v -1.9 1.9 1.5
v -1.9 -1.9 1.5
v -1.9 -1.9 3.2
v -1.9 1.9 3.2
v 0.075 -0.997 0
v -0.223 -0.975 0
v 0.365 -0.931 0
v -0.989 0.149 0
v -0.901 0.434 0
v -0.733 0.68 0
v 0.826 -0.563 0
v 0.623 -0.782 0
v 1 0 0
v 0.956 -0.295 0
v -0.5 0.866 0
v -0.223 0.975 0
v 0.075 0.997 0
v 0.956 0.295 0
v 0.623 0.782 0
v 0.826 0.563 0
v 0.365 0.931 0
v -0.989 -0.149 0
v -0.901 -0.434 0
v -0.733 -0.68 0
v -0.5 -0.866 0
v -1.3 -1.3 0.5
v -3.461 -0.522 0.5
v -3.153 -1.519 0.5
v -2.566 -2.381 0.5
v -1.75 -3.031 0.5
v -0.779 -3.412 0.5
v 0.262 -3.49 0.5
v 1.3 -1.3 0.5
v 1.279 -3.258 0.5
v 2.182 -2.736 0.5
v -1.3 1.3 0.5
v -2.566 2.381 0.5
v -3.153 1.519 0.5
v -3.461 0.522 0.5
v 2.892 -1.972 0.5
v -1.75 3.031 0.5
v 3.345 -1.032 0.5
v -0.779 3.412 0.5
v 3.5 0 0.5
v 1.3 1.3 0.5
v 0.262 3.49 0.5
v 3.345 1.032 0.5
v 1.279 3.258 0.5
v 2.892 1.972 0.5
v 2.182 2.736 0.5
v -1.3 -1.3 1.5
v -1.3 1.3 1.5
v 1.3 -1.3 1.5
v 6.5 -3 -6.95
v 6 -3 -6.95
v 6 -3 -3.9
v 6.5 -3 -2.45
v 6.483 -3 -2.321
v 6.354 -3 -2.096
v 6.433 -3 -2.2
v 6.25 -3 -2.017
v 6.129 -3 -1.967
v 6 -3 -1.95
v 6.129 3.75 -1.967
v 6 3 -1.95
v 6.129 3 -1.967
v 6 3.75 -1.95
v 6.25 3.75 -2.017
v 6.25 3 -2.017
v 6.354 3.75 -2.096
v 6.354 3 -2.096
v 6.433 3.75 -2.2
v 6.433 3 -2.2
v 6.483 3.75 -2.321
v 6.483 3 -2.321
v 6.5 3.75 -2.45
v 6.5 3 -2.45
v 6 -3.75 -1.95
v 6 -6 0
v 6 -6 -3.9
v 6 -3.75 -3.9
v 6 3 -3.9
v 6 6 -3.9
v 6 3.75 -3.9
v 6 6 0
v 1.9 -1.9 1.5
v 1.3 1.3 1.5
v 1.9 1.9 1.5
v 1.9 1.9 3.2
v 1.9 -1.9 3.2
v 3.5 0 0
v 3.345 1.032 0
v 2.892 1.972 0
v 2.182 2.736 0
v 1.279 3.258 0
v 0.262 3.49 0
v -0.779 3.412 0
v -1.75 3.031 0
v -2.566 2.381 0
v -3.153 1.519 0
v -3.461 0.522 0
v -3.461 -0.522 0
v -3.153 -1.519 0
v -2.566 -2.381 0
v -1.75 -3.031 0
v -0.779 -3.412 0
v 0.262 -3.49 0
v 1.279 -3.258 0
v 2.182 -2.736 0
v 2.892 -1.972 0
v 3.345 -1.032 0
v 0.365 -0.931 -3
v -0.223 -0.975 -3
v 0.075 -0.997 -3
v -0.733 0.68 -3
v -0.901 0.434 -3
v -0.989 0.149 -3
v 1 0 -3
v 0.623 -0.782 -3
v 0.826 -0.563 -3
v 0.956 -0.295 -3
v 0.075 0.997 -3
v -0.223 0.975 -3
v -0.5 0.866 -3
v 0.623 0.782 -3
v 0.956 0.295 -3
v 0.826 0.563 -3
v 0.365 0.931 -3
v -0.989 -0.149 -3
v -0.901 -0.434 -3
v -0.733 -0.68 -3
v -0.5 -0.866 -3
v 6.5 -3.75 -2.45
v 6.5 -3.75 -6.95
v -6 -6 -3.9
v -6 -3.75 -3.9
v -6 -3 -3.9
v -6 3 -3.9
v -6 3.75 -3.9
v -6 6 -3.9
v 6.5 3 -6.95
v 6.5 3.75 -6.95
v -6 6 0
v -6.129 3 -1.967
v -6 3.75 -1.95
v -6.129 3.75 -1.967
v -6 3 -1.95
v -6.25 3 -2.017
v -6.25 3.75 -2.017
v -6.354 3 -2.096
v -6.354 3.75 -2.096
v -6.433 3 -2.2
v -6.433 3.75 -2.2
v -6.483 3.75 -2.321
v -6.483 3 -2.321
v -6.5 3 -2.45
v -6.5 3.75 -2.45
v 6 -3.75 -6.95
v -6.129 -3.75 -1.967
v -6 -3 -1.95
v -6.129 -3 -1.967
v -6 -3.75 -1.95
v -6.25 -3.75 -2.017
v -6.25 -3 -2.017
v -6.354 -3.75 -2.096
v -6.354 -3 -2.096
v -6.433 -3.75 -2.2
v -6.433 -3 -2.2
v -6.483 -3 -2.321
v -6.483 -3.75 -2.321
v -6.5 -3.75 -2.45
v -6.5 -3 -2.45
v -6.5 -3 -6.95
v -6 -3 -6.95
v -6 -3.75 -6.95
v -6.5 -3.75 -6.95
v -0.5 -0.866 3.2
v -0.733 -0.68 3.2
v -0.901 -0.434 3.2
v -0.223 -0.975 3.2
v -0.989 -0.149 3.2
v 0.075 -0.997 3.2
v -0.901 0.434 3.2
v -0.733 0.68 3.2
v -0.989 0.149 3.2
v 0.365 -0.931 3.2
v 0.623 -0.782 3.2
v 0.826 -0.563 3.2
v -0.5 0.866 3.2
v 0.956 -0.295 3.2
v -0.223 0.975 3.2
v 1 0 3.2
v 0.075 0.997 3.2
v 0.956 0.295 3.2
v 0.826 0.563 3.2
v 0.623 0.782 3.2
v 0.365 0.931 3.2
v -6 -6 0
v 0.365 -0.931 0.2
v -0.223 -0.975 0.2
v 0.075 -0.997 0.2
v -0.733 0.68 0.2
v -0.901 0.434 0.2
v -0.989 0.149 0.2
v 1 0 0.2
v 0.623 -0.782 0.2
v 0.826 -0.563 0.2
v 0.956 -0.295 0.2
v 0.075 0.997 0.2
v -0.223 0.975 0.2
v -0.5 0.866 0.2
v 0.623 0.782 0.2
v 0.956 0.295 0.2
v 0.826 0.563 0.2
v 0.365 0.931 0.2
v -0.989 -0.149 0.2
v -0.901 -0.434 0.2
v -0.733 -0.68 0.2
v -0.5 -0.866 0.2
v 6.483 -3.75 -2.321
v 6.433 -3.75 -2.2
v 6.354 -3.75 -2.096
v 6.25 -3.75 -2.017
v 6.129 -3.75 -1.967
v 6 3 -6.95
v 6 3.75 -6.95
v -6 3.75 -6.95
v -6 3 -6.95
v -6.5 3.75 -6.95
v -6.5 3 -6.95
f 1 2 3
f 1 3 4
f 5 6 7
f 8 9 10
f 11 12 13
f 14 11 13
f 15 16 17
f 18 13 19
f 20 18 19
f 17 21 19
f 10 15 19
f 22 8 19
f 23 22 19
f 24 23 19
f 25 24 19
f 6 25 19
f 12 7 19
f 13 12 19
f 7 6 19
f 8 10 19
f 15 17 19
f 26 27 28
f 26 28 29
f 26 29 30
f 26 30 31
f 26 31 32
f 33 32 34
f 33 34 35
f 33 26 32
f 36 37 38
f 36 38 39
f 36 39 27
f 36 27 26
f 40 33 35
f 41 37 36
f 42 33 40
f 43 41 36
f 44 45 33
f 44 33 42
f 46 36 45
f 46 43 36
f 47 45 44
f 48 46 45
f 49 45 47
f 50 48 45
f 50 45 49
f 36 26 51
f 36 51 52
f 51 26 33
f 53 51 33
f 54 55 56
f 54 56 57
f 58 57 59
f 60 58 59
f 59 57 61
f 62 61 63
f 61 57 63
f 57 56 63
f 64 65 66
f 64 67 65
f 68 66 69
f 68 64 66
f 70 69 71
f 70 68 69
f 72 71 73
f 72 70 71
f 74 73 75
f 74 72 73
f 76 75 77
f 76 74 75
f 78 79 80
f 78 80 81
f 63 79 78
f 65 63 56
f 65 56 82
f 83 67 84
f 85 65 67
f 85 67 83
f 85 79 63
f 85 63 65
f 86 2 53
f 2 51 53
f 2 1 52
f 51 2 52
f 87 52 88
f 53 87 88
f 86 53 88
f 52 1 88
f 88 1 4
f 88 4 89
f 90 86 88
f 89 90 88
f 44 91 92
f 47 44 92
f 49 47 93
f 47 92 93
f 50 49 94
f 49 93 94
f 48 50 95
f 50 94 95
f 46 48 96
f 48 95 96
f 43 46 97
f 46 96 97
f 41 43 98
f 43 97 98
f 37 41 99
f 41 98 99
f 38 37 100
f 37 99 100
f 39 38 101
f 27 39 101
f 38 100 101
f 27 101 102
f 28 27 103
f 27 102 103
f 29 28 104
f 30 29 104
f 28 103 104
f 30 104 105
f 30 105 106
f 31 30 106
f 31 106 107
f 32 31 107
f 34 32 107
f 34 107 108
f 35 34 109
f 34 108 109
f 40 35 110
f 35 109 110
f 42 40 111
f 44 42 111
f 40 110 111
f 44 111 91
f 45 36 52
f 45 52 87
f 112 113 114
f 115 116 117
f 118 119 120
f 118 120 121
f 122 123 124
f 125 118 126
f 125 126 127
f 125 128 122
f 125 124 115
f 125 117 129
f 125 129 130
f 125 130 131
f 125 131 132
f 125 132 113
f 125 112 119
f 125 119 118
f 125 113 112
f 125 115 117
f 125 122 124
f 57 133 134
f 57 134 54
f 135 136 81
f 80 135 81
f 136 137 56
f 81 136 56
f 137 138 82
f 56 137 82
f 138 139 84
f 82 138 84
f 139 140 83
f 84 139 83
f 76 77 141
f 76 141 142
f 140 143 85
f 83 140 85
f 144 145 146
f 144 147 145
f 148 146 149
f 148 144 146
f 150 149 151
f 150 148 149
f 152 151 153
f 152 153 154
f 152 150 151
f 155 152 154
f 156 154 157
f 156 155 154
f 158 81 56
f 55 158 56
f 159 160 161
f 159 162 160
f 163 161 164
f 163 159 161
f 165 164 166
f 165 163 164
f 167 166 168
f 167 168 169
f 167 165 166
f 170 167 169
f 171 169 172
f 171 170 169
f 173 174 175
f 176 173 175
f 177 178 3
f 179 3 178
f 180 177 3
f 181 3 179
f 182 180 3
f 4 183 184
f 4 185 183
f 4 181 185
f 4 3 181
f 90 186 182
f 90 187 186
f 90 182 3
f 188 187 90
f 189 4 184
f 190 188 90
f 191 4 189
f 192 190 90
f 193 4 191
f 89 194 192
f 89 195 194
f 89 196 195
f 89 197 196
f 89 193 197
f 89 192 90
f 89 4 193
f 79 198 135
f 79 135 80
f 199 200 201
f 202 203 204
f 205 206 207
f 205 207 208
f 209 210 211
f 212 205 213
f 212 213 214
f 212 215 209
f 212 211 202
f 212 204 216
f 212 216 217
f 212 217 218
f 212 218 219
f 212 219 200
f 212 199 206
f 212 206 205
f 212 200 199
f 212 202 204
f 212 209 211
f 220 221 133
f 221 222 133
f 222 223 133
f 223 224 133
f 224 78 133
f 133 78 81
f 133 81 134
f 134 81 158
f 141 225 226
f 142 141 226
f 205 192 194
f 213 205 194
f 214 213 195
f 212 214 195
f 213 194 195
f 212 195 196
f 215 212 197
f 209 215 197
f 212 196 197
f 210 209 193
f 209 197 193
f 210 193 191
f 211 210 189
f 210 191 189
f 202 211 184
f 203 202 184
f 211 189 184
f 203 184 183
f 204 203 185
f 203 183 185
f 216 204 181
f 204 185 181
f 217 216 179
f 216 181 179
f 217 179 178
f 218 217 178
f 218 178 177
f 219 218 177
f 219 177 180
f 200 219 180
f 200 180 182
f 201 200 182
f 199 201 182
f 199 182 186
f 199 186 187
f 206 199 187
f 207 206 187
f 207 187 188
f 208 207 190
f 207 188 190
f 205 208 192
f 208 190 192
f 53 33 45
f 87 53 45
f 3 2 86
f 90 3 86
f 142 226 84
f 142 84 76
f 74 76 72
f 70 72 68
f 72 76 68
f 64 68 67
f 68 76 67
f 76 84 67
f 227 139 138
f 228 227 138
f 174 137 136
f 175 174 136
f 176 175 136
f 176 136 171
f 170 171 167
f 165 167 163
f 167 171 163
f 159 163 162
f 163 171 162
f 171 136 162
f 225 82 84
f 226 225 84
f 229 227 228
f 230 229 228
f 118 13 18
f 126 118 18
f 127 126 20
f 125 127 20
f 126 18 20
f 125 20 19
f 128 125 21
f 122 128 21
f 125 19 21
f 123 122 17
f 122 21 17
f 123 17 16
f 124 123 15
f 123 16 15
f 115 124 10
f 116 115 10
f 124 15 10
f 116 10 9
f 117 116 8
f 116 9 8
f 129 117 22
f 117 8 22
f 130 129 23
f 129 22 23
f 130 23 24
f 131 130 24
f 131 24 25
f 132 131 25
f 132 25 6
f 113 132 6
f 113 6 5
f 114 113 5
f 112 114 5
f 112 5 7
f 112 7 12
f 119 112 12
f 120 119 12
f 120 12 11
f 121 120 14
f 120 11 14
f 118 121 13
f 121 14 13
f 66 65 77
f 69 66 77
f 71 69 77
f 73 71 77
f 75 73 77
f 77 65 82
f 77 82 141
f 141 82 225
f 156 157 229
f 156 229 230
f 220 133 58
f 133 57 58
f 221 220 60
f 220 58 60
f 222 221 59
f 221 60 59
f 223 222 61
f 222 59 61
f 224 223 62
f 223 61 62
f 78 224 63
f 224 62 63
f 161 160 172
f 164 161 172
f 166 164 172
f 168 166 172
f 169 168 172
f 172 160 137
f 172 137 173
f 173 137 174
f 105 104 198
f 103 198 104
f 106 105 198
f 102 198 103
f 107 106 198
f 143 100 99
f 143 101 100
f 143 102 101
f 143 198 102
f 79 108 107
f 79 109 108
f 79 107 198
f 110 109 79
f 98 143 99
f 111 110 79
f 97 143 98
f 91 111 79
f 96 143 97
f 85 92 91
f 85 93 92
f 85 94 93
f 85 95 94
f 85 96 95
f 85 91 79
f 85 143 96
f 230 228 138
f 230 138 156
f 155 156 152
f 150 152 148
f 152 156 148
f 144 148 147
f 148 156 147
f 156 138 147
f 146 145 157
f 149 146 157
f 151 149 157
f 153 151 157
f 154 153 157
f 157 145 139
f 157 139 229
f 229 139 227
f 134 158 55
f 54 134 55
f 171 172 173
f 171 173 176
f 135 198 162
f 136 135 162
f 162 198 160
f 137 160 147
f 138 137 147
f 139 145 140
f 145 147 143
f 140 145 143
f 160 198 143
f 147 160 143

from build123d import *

# Parameters (mm, degrees)
F0_W      = 12
F0_H      = 12
F0_R      = 3.5
F0_W_2    = 3.8
F0_H_2    = 3.8
F0_W_3    = 2.6
F0_H_3    = 2.6
F1_DEPTH  = 3.9
F2_DEPTH  = 0.5
F3_DEPTH  = 1.5
F4_R      = 1
F5_DEPTH  = 3
F6_W      = 3.8
F6_H      = 3.8
F6_W_2    = 2.6
F6_H_2    = 2.6
F7_DEPTH  = 1.7
F8_R      = 1
F9_DEPTH  = 3
F10_W     = 0.75
F10_H     = 3.05
F10_H_2   = 1.95
F12_DEPTH = 0.5
F13_R     = 0.49999
F11_W     = 0.75
F11_H     = 1.95
F11_H_2   = 3.05
F14_DEPTH = 0.5
F15_R     = 0.49999


# Not quite as in the source:
# - a fillet or chamfer is up to 0.001 mm smaller than in the source, because OpenCascade refuses the exact size


with BuildPart() as f1:
    # F0 (on Top) → F1 (new body)
    with BuildSketch(Plane.XY):
        Rectangle(F0_W, F0_H)
        Circle(F0_R, mode=Mode.SUBTRACT)
        Circle(F0_R)
        Rectangle(F0_W_2, F0_H_2, mode=Mode.SUBTRACT)
        Rectangle(F0_W_2, F0_H_2)
        Rectangle(F0_W_3, F0_H_3, mode=Mode.SUBTRACT)
        Rectangle(F0_W_3, F0_H_3)
    extrude(amount=-F1_DEPTH)

    # F0 (on Top) → F2 (join)
    with BuildSketch(Plane.XY):
        Circle(F0_R)
        Rectangle(F0_W_2, F0_H_2, mode=Mode.SUBTRACT)
        Rectangle(F0_W_2, F0_H_2)
        Rectangle(F0_W_3, F0_H_3, mode=Mode.SUBTRACT)
    extrude(amount=F2_DEPTH)

    # F0 (on Top) → F3 (join)
    with BuildSketch(Plane.XY):
        Rectangle(F0_W_3, F0_H_3)
    extrude(amount=F3_DEPTH)

    # F4 (on face) → F5 (cut)
    with BuildSketch(Plane.XY):
        Circle(F4_R)
    extrude(amount=-F5_DEPTH, mode=Mode.SUBTRACT)

    # F6 (on face) → F7 (join)
    with BuildSketch(Plane.XY.offset(1.5)):
        Rectangle(F6_W, F6_H)
        Rectangle(F6_W_2, F6_H_2, mode=Mode.SUBTRACT)
        Rectangle(F6_W_2, F6_H_2)
    extrude(amount=F7_DEPTH)

    # F8 (on face) → F9 (cut)
    with BuildSketch(Plane.XY.offset(3.2)):
        Circle(F8_R)
    extrude(amount=-F9_DEPTH, mode=Mode.SUBTRACT)

    # F10 (on face) → F12 (join)
    with BuildSketch(Plane.YZ.offset(6)):
        with Locations((-3.375, -5.425)):
            Rectangle(F10_W, F10_H)
        with Locations((-3.375, -2.925)):
            Rectangle(F10_W, F10_H_2)
        with Locations((3.375, -5.425)):
            Rectangle(F10_W, F10_H)
        with Locations((3.375, -2.925)):
            Rectangle(F10_W, F10_H_2)
    extrude(amount=F12_DEPTH)

    # F13 (radius 0.5 in the source; OpenCascade refuses exactly that, so slightly less here)
    f13_edges = [f1.edges().sort_by_distance(p)[0] for p in [
        (6.5, -3.375, -1.95),
        (6.5, 3.375, -1.95),
    ]]
    fillet(f13_edges, radius=F13_R)

    # F11 (on face) → F14 (join)
    with BuildSketch(Plane(origin=(-6, 0, 0), x_dir=(0, -1, 0), z_dir=(-1, 0, 0))):
        with Locations((3.375, -2.925)):
            Rectangle(F11_W, F11_H)
        with Locations((-3.375, -2.925)):
            Rectangle(F11_W, F11_H)
        with Locations((-3.375, -5.425)):
            Rectangle(F11_W, F11_H_2)
        with Locations((3.375, -5.425)):
            Rectangle(F11_W, F11_H_2)
    extrude(amount=F14_DEPTH)

    # F15 (radius 0.5 in the source; OpenCascade refuses exactly that, so slightly less here)
    f15_edges = [f1.edges().sort_by_distance(p)[0] for p in [
        (-6.5, 3.375, -1.95),
        (-6.5, -3.375, -1.95),
    ]]
    fillet(f15_edges, radius=F15_R)


solid = f1.part
